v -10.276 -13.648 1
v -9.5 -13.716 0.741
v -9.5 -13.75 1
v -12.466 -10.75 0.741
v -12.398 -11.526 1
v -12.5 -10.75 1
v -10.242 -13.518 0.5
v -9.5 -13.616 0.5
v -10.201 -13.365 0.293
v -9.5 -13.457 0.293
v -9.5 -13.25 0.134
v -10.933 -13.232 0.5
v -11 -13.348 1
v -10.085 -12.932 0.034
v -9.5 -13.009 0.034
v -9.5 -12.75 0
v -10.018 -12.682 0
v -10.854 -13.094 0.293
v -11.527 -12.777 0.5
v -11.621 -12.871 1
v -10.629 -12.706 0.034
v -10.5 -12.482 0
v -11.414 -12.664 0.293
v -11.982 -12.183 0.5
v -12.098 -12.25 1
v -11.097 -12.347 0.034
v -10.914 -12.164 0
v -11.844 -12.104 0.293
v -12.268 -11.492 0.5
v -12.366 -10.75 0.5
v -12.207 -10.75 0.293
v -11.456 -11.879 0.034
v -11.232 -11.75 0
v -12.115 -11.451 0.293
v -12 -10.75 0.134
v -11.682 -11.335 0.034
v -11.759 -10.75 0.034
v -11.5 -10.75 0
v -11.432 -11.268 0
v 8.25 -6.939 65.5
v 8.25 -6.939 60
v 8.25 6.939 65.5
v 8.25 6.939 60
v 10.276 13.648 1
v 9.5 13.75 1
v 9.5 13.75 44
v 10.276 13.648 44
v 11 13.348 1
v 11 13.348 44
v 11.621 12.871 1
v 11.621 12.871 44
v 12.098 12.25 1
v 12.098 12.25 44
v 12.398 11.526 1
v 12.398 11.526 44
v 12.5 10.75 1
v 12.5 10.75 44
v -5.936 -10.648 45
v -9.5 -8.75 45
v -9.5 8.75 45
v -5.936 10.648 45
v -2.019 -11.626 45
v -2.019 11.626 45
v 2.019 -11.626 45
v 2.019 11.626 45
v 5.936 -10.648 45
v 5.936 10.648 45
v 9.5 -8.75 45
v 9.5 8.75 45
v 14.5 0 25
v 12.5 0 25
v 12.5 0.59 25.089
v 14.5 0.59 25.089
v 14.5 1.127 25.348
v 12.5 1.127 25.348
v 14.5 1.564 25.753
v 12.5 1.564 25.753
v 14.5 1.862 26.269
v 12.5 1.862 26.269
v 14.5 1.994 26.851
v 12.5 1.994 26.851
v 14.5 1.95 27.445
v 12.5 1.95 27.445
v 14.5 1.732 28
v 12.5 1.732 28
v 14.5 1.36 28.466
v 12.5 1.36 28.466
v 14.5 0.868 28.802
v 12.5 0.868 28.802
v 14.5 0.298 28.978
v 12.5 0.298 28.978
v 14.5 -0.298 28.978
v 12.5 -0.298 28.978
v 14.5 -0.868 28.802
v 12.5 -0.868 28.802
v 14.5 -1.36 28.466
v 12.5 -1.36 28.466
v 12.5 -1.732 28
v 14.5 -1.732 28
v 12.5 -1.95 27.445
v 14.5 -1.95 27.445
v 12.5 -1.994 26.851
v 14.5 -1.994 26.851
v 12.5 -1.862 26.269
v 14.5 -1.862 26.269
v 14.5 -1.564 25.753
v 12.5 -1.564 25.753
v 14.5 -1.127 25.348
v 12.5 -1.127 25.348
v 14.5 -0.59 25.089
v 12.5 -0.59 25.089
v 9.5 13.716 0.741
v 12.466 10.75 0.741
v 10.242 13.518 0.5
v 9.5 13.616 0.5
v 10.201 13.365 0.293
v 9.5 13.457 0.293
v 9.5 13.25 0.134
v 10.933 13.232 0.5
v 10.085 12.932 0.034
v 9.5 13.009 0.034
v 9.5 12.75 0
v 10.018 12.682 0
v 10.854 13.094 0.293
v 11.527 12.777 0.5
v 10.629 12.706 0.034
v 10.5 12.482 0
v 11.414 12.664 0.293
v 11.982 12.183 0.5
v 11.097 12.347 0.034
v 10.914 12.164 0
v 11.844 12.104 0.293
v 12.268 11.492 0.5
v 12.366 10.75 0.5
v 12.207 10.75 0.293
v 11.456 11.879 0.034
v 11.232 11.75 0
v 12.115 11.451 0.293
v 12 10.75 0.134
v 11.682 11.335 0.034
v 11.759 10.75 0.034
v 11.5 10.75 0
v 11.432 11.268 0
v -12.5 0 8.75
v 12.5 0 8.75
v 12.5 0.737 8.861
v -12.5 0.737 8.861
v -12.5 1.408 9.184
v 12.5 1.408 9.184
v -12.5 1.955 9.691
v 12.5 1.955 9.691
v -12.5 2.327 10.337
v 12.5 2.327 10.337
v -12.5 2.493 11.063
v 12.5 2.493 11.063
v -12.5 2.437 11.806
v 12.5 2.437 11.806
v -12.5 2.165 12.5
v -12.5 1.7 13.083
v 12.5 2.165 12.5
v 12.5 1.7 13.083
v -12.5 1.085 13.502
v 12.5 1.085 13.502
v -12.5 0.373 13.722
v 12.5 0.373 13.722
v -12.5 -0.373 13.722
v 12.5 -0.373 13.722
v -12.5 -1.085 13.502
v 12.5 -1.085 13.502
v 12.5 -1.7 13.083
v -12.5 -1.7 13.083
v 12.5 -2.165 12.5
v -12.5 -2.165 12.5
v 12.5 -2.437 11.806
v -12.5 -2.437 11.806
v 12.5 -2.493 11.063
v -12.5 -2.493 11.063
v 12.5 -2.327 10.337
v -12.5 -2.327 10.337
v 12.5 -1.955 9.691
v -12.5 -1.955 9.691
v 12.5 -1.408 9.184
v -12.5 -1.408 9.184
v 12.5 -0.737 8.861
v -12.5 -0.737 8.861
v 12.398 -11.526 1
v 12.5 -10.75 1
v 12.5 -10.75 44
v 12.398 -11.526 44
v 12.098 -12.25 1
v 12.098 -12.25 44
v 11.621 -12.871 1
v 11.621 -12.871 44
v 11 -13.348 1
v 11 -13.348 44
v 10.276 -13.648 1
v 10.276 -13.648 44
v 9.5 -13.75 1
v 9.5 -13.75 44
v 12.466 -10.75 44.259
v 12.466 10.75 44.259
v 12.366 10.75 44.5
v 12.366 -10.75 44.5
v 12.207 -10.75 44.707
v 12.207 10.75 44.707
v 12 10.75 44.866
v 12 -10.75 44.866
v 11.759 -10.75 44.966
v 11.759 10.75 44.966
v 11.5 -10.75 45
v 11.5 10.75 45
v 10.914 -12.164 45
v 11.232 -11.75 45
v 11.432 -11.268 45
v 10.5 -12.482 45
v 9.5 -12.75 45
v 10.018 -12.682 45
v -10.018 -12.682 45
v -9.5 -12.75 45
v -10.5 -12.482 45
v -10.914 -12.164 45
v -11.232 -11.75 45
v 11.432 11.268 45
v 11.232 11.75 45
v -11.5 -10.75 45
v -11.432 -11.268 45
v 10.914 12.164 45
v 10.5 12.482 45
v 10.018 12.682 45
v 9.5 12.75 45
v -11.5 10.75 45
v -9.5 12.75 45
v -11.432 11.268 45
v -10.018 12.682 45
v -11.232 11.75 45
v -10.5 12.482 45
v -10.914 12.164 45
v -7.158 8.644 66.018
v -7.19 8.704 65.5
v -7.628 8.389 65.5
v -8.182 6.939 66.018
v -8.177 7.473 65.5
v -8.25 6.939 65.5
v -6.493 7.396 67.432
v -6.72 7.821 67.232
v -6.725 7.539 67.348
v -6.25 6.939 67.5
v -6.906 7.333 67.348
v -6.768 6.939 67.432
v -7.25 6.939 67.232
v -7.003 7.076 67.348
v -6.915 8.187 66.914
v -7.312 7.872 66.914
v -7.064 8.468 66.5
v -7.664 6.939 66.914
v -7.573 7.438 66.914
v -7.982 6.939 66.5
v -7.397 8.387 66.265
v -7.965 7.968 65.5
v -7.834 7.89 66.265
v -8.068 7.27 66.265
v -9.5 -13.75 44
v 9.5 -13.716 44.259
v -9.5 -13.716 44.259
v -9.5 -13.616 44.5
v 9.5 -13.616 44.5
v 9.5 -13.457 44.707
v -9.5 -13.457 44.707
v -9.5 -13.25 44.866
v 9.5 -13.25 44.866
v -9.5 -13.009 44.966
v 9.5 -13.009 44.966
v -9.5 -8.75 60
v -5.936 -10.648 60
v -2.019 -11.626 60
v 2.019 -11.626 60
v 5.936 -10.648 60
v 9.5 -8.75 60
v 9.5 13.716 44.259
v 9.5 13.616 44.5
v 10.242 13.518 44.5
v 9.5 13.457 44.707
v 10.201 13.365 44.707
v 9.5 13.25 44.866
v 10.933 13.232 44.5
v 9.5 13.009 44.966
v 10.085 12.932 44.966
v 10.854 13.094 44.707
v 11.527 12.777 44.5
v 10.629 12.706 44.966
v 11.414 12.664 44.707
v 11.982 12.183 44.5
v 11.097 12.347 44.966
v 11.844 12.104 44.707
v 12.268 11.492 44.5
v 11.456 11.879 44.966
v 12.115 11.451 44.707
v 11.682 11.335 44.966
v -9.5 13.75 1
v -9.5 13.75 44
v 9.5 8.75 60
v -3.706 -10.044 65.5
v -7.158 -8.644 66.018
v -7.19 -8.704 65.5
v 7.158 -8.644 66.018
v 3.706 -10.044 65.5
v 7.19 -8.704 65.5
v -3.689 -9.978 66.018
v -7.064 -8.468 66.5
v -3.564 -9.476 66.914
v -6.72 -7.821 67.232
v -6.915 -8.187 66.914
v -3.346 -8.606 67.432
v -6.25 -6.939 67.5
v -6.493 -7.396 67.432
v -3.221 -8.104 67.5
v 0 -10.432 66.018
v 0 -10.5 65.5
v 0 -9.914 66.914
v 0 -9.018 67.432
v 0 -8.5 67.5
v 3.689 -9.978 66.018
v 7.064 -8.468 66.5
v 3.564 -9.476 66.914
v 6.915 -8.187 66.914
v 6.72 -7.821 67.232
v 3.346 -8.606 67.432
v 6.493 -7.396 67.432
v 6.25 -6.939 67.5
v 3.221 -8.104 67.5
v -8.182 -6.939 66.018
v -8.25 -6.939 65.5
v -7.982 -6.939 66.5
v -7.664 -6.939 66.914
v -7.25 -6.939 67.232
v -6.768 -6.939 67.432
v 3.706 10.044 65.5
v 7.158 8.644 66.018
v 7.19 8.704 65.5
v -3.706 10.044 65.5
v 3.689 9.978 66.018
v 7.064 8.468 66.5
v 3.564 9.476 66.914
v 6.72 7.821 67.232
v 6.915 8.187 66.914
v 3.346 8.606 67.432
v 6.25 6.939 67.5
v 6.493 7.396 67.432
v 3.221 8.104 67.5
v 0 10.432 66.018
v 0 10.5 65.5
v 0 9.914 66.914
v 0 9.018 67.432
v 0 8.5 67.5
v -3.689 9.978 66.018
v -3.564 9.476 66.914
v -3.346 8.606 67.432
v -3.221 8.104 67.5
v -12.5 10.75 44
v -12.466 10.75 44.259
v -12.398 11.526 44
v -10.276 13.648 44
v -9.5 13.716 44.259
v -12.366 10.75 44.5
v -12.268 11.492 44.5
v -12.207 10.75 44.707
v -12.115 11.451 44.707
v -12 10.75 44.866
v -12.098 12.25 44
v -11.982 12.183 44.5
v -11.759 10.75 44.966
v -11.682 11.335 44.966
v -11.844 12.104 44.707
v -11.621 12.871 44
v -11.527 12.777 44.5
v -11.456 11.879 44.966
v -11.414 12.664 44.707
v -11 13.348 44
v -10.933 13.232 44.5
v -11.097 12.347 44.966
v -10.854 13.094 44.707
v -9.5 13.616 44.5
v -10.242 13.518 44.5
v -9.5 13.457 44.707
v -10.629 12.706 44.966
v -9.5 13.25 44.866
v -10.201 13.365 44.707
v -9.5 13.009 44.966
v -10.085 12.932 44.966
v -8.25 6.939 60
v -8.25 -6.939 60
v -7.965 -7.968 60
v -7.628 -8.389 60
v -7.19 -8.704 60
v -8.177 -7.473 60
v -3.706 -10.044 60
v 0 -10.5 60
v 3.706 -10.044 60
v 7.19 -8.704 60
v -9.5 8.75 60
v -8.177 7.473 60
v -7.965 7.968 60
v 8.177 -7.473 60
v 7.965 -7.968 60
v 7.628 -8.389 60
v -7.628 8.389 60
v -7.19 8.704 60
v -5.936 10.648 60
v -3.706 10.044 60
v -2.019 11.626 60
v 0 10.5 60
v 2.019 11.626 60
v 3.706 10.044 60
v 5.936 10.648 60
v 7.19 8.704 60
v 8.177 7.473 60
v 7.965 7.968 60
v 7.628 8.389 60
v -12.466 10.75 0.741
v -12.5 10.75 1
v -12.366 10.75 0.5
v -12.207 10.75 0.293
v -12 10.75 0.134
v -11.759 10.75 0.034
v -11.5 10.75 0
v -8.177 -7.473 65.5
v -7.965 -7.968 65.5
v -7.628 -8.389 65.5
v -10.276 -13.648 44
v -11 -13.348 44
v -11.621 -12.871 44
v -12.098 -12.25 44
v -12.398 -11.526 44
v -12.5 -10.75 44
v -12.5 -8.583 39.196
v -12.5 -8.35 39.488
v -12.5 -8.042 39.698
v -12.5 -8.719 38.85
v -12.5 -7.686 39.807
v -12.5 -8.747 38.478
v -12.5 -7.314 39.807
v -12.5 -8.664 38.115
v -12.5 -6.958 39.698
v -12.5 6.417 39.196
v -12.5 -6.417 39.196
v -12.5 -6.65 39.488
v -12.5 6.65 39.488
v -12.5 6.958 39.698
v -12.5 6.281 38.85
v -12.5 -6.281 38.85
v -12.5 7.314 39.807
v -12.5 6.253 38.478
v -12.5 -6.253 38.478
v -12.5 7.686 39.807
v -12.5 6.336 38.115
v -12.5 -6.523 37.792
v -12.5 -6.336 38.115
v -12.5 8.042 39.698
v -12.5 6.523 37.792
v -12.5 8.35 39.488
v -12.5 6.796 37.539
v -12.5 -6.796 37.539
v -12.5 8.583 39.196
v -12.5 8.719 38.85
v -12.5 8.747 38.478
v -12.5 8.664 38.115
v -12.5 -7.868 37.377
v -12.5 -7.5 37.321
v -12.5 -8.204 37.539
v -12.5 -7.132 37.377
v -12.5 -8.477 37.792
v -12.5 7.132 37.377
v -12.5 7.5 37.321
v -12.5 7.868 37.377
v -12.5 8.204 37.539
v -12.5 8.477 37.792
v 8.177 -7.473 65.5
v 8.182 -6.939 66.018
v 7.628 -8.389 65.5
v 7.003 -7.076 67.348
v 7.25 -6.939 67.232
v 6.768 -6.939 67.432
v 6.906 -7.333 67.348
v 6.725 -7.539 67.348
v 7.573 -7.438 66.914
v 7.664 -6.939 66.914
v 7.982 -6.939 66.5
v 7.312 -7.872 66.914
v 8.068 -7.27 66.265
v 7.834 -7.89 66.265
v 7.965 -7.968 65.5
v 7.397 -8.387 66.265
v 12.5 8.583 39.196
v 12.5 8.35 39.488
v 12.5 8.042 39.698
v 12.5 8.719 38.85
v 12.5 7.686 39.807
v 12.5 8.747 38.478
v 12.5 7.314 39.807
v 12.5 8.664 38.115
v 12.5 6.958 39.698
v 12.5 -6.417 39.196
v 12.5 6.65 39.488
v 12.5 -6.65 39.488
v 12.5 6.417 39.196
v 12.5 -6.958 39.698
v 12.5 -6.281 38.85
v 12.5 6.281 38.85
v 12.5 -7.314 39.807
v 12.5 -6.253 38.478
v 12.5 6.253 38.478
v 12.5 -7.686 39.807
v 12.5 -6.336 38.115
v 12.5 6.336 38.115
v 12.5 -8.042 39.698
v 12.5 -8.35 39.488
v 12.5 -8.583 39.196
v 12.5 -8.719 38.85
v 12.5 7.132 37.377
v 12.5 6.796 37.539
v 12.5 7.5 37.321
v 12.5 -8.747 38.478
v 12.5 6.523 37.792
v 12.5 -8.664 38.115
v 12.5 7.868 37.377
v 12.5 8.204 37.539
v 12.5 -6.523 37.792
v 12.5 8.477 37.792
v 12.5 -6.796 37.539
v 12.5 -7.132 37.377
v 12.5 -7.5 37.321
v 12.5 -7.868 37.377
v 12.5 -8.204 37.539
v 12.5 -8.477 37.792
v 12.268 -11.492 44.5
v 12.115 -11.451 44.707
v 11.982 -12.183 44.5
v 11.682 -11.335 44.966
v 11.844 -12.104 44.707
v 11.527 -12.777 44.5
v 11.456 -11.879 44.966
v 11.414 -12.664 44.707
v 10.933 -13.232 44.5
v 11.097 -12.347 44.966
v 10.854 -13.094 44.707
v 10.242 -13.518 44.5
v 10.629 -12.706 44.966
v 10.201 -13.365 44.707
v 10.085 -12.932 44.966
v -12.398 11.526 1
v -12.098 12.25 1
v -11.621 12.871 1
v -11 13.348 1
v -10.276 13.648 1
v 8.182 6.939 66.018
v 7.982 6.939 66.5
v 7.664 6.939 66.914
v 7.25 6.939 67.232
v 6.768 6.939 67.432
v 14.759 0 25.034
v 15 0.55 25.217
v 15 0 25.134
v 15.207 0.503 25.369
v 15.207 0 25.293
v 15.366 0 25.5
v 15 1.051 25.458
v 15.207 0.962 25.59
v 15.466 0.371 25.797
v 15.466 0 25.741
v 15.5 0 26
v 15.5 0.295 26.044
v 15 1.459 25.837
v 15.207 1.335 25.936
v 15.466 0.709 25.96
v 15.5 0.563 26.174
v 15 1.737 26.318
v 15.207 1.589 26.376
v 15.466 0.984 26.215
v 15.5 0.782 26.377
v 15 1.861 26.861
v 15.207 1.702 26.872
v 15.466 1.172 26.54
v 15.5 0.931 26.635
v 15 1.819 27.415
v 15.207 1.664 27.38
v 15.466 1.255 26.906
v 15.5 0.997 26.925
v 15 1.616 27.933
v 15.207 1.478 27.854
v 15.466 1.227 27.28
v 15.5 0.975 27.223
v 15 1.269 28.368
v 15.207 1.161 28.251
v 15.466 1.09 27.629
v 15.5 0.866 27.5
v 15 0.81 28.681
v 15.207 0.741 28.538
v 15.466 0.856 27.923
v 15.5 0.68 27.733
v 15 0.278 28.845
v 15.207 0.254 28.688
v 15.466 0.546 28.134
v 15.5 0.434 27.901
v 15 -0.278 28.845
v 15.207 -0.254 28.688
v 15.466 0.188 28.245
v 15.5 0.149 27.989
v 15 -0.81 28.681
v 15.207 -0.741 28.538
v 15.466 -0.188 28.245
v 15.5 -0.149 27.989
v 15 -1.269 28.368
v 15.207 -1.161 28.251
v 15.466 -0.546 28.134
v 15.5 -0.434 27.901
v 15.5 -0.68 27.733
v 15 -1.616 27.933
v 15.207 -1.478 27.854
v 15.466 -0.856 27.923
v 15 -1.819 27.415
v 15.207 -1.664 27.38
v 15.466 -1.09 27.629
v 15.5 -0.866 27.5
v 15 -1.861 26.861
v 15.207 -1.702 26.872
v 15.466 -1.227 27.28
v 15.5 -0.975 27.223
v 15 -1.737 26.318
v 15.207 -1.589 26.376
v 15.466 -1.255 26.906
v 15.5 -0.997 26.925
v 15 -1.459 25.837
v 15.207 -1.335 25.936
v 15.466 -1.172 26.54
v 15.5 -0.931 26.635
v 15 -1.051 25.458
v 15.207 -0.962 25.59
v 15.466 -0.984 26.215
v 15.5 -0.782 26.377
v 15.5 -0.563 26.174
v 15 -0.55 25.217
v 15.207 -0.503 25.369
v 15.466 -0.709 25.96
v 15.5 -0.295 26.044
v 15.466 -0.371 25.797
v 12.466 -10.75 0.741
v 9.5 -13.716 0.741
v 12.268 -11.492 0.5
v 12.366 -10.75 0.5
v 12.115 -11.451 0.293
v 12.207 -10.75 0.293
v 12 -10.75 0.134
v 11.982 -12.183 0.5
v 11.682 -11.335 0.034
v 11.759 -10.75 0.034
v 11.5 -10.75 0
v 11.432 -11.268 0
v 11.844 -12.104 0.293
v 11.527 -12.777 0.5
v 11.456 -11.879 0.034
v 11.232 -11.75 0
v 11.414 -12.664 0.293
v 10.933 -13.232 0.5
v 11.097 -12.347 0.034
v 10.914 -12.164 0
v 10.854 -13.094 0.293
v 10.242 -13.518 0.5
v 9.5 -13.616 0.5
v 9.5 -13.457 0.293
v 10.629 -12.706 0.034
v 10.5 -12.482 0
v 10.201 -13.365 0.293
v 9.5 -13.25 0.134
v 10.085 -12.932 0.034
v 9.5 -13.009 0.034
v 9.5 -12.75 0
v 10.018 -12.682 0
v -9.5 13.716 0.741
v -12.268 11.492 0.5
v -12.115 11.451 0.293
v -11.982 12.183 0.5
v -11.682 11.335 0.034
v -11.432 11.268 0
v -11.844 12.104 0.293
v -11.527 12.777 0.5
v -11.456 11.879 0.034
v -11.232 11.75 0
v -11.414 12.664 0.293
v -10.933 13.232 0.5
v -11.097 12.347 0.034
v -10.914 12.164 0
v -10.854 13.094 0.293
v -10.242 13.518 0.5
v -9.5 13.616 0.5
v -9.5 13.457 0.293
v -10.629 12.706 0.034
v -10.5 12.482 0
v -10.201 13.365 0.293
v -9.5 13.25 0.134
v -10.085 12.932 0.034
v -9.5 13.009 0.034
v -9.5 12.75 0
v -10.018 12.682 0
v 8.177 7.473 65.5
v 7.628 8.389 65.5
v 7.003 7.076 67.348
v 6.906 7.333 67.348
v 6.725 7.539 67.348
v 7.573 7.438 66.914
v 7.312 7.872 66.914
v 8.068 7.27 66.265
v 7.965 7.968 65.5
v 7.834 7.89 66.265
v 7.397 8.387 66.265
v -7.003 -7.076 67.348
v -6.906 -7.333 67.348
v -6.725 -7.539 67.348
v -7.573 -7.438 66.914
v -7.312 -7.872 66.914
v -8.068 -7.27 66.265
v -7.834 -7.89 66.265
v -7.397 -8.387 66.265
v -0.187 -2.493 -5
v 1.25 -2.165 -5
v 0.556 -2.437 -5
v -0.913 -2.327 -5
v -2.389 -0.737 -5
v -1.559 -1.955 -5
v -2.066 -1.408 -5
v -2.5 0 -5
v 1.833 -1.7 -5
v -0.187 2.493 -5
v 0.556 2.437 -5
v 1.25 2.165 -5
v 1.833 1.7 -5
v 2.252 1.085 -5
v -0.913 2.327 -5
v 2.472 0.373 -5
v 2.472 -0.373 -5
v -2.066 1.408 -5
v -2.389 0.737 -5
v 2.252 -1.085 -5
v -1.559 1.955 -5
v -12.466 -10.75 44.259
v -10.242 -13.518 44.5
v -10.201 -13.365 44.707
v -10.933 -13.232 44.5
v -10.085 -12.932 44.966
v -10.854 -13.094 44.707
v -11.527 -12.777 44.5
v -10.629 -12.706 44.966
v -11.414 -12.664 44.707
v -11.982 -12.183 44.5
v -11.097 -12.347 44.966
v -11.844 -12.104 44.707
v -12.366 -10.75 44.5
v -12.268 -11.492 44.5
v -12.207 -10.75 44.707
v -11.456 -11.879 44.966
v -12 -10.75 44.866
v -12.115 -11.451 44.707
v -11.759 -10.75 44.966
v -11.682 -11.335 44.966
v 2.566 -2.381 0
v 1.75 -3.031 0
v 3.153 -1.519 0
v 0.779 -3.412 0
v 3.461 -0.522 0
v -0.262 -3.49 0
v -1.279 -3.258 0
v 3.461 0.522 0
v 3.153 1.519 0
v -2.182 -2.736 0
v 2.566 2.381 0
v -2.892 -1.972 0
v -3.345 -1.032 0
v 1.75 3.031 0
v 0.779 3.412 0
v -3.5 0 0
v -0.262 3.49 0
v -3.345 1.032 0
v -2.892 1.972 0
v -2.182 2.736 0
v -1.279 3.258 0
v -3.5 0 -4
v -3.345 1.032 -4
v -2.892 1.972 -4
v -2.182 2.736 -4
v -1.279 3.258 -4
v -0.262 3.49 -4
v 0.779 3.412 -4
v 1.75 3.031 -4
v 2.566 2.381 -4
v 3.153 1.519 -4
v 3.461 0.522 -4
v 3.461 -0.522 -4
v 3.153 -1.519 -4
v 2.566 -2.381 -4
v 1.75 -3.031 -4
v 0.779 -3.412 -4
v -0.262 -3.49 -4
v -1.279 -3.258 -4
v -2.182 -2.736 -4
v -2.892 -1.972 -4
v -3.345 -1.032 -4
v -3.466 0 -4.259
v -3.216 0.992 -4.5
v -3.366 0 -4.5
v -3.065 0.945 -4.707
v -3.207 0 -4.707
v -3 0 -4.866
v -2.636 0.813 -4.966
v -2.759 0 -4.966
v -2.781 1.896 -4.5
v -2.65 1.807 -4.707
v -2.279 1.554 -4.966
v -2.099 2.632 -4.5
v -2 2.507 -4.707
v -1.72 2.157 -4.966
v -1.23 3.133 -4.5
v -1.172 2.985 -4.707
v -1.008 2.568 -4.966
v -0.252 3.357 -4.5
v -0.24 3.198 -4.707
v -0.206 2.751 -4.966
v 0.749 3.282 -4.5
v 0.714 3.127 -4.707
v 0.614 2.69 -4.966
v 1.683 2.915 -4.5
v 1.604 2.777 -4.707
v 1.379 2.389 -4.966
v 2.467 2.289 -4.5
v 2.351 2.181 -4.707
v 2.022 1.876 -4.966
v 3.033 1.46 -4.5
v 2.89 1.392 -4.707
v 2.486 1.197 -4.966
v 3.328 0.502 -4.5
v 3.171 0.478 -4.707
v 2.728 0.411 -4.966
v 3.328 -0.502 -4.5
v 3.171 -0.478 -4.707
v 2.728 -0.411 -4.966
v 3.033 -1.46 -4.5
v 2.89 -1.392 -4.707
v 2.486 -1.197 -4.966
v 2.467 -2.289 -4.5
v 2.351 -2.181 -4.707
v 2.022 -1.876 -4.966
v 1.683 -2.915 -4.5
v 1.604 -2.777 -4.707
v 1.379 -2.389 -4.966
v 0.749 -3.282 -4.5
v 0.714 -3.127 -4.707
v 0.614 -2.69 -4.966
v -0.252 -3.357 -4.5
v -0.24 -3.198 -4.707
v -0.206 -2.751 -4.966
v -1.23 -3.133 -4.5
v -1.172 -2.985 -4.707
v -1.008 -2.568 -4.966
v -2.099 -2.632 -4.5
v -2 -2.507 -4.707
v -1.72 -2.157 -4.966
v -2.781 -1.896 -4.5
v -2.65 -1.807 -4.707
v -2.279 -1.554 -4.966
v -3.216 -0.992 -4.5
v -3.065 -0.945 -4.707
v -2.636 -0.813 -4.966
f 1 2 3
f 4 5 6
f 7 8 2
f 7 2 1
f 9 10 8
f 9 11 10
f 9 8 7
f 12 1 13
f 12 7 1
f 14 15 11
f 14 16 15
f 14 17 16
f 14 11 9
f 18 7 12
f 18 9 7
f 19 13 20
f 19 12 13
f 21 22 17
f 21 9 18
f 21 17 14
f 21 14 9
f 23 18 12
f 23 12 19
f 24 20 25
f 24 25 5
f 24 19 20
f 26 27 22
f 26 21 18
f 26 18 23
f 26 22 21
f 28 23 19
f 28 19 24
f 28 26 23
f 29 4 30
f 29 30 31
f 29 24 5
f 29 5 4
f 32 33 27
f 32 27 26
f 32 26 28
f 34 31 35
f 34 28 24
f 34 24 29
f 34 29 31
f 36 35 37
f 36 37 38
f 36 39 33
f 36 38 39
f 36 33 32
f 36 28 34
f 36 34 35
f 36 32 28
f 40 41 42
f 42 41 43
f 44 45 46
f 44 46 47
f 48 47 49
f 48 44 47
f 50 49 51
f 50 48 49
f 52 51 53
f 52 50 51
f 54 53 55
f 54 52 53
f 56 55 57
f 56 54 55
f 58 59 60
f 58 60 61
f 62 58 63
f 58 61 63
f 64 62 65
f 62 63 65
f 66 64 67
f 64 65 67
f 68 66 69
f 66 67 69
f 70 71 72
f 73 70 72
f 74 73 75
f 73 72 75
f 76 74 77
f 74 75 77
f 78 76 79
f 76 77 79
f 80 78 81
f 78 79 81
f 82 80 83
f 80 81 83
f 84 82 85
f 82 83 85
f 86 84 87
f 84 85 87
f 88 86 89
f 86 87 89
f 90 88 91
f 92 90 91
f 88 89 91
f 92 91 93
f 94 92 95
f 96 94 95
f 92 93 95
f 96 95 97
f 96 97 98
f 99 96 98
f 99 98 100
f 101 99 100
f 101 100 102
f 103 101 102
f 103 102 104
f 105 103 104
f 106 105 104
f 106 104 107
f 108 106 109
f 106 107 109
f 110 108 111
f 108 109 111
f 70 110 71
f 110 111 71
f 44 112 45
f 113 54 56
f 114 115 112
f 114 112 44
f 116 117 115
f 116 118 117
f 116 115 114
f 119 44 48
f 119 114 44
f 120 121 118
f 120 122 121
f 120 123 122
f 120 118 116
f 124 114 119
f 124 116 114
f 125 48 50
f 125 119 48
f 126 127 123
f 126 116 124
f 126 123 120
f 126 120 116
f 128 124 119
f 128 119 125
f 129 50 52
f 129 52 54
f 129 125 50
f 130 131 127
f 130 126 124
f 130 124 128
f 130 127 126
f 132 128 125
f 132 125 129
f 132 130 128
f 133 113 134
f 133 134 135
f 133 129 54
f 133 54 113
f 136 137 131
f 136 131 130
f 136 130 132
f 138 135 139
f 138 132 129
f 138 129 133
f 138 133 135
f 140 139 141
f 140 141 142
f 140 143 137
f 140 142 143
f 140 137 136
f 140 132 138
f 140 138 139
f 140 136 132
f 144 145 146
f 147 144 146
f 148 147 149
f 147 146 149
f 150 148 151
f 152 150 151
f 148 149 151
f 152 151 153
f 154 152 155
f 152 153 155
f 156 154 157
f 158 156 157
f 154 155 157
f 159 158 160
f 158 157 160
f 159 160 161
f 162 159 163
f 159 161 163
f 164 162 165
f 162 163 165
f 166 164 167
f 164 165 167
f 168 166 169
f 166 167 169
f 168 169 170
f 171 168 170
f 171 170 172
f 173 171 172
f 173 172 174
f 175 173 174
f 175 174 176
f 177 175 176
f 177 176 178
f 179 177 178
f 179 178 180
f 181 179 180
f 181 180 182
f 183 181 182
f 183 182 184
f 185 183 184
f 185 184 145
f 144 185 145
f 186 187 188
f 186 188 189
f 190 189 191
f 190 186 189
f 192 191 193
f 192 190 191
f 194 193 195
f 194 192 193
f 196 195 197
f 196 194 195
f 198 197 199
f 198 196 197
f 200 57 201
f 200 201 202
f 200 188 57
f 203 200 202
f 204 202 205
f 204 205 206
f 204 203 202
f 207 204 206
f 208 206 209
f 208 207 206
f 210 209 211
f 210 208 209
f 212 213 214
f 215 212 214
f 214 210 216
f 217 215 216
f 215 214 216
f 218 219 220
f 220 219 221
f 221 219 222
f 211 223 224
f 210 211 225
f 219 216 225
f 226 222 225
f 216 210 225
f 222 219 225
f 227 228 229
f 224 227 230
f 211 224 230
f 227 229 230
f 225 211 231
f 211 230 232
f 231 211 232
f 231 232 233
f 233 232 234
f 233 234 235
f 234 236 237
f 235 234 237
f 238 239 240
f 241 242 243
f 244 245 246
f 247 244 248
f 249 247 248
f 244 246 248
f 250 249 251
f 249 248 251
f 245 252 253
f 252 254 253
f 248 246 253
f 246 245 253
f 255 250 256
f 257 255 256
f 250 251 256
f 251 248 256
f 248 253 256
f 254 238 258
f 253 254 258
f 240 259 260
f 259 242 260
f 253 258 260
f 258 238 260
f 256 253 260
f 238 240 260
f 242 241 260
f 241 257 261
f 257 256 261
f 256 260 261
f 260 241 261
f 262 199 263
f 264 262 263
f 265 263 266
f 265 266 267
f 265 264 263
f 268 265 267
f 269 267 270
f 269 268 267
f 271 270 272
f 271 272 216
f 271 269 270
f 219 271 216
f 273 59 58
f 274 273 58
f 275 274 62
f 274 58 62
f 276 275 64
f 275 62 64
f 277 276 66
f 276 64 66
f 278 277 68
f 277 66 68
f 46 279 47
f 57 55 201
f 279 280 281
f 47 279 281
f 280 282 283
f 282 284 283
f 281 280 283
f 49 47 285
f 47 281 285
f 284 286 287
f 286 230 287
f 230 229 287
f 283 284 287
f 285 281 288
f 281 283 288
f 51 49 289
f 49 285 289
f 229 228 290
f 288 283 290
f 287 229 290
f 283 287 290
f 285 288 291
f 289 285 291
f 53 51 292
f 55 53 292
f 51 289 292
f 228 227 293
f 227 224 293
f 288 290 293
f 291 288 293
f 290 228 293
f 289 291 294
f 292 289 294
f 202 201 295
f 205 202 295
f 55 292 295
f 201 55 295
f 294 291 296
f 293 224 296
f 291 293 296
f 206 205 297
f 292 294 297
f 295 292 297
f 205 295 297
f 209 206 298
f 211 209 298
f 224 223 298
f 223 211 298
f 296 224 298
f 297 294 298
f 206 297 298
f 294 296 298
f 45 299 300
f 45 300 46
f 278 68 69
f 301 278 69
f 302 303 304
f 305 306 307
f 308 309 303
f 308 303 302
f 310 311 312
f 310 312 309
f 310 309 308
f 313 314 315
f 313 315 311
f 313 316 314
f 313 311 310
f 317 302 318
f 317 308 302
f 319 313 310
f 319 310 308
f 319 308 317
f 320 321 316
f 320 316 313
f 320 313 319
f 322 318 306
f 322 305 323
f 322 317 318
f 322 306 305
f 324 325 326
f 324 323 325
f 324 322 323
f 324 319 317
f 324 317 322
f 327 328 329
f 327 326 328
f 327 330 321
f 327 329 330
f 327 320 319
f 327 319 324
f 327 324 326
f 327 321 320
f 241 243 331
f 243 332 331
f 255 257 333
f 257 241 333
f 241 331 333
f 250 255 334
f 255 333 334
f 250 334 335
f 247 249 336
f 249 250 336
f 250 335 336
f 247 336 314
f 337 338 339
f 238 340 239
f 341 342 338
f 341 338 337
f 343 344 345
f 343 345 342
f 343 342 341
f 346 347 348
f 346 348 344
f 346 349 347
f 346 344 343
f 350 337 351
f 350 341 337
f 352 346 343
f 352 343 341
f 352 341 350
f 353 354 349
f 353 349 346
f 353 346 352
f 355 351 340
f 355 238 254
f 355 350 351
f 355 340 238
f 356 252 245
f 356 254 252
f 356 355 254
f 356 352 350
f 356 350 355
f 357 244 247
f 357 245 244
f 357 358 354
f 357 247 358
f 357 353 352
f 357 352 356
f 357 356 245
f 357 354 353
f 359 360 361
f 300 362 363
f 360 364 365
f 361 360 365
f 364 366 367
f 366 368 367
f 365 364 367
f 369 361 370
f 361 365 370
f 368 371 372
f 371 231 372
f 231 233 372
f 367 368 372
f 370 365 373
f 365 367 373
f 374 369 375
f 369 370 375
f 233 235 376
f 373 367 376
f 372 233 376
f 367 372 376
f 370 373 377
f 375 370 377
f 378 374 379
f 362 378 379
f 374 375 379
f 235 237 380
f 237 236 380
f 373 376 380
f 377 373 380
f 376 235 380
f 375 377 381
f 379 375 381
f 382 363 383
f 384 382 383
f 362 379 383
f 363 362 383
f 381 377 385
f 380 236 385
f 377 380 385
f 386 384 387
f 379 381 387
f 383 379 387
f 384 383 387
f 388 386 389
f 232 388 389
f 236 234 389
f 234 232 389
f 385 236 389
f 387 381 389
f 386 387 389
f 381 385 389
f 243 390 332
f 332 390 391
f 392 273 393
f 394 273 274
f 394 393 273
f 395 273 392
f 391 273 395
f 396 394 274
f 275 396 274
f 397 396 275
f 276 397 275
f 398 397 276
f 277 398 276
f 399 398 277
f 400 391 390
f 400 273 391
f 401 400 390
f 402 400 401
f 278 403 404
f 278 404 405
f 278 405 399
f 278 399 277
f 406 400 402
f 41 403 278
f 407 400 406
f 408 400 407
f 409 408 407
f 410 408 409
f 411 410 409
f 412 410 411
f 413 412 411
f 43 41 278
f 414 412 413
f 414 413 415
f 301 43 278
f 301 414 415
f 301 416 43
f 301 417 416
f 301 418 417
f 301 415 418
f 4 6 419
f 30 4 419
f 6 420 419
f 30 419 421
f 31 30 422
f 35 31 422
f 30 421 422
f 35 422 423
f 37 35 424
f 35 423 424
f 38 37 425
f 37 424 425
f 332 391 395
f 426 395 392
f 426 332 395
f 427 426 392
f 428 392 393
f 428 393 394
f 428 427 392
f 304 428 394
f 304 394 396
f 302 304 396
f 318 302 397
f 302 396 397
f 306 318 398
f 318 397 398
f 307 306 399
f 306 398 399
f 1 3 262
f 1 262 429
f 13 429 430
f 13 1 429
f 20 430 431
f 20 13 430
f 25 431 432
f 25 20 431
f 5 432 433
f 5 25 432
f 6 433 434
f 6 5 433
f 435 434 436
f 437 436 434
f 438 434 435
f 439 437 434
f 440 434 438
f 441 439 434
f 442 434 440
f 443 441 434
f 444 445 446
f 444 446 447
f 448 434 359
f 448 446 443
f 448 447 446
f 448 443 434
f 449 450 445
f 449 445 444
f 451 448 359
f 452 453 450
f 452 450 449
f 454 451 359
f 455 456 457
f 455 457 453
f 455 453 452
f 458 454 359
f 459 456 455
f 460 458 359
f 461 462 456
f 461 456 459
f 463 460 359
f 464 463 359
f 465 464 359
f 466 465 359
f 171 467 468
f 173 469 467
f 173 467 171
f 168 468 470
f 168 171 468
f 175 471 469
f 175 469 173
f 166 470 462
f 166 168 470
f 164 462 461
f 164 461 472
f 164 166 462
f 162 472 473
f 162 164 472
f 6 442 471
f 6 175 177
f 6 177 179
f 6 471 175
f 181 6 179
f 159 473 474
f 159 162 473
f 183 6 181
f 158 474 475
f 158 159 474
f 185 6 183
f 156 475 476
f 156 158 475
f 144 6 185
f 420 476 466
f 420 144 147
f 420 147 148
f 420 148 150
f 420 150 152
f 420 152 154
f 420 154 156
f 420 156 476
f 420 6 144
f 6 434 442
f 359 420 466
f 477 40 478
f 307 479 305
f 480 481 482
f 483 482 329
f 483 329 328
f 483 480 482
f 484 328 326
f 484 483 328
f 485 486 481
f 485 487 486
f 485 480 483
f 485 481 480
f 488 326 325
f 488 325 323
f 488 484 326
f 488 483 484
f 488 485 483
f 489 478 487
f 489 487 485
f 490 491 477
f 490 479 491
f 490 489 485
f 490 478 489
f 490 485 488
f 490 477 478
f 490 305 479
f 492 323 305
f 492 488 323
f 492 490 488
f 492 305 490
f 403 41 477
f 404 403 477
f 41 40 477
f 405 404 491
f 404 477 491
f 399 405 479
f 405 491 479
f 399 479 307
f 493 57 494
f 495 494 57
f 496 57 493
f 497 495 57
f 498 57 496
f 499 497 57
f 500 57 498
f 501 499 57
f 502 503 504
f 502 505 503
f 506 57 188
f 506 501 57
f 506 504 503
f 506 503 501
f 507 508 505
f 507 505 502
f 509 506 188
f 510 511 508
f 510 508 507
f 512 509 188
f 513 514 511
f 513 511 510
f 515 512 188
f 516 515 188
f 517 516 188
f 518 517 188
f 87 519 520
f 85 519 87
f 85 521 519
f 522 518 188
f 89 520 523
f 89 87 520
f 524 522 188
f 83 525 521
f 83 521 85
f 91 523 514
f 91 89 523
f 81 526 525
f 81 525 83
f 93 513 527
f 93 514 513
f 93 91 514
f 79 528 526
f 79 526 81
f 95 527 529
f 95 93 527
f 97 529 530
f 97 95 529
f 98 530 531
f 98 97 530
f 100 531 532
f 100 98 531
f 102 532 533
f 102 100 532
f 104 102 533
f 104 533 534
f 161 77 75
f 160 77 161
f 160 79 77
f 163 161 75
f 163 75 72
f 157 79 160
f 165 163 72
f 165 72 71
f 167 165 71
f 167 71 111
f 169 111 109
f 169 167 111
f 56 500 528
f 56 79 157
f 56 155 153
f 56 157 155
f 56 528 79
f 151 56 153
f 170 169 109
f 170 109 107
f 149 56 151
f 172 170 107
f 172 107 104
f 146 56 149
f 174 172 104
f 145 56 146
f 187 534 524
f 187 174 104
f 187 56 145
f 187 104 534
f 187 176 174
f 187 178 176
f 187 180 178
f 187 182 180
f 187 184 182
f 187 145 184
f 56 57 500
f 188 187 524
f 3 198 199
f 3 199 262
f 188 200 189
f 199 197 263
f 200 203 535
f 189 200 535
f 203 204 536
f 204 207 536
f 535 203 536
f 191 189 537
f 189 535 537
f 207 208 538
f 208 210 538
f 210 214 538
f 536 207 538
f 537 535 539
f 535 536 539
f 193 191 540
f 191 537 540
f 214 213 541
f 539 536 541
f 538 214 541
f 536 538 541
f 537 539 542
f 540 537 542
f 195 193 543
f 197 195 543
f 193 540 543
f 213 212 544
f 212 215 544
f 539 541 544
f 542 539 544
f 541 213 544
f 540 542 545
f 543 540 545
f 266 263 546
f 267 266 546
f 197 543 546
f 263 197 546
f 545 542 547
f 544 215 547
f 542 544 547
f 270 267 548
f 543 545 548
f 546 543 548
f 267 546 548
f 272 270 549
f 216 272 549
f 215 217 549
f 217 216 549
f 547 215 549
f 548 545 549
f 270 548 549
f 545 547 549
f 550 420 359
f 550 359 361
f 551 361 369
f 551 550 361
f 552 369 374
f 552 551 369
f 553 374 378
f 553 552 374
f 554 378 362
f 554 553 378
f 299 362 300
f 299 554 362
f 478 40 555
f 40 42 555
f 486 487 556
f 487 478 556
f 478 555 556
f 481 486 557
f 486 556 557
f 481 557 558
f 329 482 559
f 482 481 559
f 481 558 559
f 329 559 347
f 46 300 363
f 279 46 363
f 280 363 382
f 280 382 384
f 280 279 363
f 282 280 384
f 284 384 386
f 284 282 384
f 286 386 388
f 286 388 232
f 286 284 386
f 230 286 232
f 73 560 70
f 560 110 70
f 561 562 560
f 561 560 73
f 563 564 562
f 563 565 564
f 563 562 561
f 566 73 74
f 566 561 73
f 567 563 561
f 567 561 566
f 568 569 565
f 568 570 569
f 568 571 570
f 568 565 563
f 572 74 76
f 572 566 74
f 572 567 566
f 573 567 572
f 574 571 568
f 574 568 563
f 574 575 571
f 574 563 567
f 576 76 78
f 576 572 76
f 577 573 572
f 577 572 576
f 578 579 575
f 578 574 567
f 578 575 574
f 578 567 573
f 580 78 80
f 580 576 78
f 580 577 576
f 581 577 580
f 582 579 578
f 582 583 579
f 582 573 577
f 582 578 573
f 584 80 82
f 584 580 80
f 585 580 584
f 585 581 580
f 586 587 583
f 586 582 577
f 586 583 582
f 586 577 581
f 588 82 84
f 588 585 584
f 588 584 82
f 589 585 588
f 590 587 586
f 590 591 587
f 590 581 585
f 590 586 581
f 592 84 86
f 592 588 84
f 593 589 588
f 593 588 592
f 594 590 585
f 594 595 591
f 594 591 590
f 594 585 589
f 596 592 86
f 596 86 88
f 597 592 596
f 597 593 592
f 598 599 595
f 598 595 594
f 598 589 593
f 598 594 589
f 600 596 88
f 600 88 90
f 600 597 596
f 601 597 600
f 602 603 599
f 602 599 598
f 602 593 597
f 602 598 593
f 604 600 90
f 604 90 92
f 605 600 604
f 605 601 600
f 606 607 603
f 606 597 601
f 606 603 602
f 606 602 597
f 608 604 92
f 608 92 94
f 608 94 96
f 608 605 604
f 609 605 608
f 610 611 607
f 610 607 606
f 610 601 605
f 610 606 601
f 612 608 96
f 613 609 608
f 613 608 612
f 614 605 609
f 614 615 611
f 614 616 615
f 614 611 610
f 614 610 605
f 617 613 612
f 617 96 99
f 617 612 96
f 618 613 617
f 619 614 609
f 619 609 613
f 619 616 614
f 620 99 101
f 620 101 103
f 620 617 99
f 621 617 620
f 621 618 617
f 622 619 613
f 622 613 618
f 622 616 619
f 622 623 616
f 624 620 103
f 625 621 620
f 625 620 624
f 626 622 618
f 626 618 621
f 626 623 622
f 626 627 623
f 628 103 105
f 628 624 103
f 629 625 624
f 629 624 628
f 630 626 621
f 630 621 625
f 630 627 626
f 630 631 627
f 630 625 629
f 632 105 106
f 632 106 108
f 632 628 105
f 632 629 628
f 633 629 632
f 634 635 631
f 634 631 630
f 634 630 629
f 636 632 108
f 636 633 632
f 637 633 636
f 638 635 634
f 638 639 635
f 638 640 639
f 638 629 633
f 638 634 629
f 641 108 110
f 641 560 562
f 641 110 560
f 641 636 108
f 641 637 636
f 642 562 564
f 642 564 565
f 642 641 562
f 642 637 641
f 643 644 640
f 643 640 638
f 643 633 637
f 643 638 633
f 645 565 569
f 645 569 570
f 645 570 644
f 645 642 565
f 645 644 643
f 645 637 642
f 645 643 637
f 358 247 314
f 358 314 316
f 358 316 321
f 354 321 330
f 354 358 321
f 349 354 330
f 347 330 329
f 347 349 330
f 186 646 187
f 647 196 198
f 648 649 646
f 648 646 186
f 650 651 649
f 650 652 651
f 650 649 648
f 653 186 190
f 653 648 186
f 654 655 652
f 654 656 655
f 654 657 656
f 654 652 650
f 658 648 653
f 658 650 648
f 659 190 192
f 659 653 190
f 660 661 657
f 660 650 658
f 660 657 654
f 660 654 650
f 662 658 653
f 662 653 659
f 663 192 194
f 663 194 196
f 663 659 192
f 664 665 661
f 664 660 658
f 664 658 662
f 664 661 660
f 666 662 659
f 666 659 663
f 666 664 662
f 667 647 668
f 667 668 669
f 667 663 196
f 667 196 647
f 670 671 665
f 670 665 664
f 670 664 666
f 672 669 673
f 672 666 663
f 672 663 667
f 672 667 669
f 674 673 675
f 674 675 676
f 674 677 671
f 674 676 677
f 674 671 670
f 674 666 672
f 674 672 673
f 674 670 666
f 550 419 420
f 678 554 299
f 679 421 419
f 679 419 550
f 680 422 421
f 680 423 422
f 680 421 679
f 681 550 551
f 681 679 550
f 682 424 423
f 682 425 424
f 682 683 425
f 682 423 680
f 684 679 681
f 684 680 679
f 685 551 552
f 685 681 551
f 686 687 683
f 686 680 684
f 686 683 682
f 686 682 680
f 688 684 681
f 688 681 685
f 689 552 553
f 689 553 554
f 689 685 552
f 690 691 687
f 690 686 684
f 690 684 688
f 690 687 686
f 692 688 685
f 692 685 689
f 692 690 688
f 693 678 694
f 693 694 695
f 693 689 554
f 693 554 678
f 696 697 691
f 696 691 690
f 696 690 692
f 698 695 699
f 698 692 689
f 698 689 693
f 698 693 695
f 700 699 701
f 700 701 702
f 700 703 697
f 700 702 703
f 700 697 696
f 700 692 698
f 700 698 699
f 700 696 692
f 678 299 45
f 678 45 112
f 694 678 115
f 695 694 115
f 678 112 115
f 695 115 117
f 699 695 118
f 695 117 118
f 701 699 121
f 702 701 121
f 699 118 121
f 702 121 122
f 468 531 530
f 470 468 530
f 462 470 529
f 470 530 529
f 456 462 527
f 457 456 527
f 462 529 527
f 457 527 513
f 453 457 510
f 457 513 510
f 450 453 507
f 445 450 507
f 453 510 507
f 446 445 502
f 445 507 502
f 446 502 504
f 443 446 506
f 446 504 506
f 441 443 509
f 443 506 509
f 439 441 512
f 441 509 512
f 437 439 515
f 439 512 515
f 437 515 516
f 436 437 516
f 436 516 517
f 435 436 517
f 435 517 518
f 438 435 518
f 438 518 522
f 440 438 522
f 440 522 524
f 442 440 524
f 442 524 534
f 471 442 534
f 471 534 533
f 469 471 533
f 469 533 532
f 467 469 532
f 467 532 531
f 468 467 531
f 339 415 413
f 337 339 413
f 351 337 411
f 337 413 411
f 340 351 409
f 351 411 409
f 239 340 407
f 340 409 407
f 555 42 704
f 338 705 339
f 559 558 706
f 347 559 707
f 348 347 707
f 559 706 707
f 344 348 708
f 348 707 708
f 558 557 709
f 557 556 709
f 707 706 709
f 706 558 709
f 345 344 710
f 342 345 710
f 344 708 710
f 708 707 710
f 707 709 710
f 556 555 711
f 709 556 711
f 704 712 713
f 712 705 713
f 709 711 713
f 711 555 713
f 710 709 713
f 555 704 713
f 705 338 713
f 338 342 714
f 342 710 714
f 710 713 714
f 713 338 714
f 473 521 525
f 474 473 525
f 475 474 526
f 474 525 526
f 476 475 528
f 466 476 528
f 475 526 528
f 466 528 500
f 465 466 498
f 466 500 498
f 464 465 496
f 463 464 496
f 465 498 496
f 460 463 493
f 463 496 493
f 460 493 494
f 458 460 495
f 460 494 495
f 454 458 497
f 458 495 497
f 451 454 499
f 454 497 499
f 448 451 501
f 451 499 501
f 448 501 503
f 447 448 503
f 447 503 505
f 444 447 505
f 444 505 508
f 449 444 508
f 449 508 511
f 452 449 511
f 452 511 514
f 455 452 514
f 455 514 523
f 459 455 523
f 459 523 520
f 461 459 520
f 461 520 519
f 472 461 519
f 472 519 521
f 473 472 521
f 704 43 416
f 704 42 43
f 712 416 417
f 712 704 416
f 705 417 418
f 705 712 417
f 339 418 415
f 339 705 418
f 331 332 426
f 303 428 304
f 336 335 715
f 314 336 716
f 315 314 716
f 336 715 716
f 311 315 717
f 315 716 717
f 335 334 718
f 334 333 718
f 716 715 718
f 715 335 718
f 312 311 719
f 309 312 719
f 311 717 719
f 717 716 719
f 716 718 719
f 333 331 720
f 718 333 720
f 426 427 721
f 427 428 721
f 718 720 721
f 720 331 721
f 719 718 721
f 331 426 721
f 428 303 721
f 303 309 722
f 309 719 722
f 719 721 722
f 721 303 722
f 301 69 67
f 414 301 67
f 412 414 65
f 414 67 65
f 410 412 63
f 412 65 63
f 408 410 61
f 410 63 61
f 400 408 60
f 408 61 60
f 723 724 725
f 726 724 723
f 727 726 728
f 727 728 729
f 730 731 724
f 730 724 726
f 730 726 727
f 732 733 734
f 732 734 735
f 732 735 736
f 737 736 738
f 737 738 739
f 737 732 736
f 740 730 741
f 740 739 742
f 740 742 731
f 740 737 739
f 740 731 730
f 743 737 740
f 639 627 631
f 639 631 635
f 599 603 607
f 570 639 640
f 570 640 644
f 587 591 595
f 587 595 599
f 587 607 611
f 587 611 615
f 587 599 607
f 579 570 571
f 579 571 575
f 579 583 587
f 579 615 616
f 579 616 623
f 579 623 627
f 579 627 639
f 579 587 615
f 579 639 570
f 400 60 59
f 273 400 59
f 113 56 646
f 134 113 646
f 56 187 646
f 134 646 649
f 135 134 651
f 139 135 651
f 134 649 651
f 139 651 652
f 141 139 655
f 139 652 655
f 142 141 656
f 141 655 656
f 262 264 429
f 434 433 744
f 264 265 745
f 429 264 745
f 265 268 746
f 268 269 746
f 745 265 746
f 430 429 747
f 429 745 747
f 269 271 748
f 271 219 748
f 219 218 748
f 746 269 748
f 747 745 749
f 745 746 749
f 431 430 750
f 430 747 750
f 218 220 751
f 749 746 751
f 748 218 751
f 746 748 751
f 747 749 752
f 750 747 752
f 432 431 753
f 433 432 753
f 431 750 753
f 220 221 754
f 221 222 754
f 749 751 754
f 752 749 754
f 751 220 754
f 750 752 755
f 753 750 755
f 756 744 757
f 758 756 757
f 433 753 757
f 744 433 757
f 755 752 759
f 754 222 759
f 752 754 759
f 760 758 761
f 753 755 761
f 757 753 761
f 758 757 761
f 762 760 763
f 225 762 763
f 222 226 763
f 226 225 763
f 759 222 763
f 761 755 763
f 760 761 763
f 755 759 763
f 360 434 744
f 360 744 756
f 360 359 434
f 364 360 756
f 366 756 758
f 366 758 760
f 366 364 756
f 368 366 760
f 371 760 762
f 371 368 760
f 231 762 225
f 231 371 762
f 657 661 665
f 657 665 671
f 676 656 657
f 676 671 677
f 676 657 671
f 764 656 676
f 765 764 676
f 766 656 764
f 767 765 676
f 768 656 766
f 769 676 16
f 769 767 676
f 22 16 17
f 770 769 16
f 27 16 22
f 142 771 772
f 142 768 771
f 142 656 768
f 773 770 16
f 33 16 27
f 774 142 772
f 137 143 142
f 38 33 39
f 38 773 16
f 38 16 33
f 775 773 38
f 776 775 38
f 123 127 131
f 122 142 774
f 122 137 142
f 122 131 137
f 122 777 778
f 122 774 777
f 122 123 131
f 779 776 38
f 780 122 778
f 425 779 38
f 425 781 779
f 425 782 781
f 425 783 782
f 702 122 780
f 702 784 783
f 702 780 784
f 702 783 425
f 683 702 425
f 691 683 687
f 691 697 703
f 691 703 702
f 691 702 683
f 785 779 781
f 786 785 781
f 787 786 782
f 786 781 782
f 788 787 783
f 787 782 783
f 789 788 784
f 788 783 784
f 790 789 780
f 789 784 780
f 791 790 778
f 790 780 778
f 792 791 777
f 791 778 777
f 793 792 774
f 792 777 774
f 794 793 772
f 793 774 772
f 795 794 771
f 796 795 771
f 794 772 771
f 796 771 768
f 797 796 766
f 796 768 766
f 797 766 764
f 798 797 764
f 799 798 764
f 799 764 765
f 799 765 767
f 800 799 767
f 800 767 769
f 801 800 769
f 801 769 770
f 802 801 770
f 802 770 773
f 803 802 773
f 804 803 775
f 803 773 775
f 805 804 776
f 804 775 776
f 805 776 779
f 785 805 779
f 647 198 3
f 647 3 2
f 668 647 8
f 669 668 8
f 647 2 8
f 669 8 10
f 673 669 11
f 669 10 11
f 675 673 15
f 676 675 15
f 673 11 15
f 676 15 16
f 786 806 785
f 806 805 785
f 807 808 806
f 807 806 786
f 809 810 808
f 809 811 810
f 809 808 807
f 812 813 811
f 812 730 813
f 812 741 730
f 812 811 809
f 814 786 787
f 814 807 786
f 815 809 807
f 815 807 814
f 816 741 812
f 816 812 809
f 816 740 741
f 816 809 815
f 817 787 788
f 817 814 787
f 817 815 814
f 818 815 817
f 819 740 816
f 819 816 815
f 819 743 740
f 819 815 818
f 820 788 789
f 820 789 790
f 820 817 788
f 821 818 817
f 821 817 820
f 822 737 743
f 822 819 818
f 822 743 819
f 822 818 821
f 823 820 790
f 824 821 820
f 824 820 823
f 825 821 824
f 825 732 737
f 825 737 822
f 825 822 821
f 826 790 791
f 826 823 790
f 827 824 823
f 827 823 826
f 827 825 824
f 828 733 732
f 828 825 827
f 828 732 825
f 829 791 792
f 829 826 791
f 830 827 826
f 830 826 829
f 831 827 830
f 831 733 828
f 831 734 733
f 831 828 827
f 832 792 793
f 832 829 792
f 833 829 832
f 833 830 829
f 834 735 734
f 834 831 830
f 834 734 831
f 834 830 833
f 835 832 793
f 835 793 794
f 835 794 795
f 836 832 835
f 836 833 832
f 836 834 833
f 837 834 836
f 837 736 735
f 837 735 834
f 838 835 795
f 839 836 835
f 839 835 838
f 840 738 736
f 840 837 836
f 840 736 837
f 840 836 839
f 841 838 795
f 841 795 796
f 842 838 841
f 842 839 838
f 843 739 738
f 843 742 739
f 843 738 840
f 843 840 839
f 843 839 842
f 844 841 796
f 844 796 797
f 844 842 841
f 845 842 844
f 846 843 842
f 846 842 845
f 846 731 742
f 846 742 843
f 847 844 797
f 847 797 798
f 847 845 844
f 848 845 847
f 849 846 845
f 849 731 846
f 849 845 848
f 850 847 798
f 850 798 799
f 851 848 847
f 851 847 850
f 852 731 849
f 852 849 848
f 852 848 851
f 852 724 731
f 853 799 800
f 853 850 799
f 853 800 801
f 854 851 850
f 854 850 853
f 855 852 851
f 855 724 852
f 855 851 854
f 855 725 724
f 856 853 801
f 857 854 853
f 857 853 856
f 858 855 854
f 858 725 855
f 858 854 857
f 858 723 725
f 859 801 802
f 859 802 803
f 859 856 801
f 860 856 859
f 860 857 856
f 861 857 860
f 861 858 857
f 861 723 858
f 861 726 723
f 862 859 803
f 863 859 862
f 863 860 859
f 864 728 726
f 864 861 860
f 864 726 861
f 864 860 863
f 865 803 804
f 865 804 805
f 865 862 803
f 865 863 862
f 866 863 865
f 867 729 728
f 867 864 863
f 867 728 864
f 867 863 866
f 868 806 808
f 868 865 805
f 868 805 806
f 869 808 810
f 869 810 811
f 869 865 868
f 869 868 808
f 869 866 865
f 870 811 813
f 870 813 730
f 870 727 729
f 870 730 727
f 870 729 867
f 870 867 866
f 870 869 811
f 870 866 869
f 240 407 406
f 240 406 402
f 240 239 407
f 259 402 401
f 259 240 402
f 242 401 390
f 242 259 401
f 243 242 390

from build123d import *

# Parameters (mm, degrees)
MOTORBODY1_DEPTH            = 45
MOTORBODY2_DEPTH            = 15
SIDE_ENGRAVEMENT_SKETCH_R   = 1.25
SIDE_ENGRAVEMENT_SKETCH_R_2 = 2.5
CUT_EXTRUDE1_DEPTH          = 26
SIDE_ENGRAVEMENT_SKETCH_3_R = 2
BOSS_EXTRUDE3_DEPTH         = 3
SKETCH4_R                   = 3.5
BOSS_EXTRUDE5_DEPTH         = 5
FILLET1_R                   = 1
BOSS_EXTRUDE6_DEPTH         = 7.5
FILLET3_R                   = 2


with BuildPart() as part:
    # MotorMainSketch → MotorBody1 (new body)
    with BuildSketch(Plane.XY):
        with BuildLine():
            Line((-9.5, 13.75), (9.5, 13.75))
            ThreePointArc((9.5, 13.75), (11.621320344, 12.871320344), (12.5, 10.75))
            Line((12.5, 10.75), (12.5, -10.75))
            ThreePointArc((12.5, -10.75), (11.621320344, -12.871320344), (9.5, -13.75))
            Line((9.5, -13.75), (-9.5, -13.75))
            ThreePointArc((-9.5, -13.75), (-11.621320344, -12.871320344), (-12.5, -10.75))
            Line((-12.5, -10.75), (-12.5, 10.75))
            ThreePointArc((-12.5, 10.75), (-11.621320344, 12.871320344), (-9.5, 13.75))
        make_face()
    extrude(amount=MOTORBODY1_DEPTH)

    # side engravement sketch → Cut-Extrude1 (cut, through all)
    with BuildSketch(Plane(origin=(12.5, 0, 0), x_dir=(0, 0, -1), z_dir=(1, 0, 0))):
        with Locations((-38.571428571, 7.5)):
            Circle(SIDE_ENGRAVEMENT_SKETCH_R)
        with Locations((-38.571428571, -7.5)):
            Circle(SIDE_ENGRAVEMENT_SKETCH_R)
        with Locations((-11.25, 0)):
            Circle(SIDE_ENGRAVEMENT_SKETCH_R_2)
    extrude(amount=-CUT_EXTRUDE1_DEPTH, mode=Mode.SUBTRACT)

    # side engravement sketch_3 → Boss-Extrude3 (add)
    with BuildSketch(Plane(origin=(12.5, 0, 0), x_dir=(0, 0, -1), z_dir=(1, 0, 0))):
        with Locations((-27, 0)):
            Circle(SIDE_ENGRAVEMENT_SKETCH_3_R)
    extrude(amount=BOSS_EXTRUDE3_DEPTH)

    # Sketch4 → Boss-Extrude5 (add)
    with BuildSketch(Plane(origin=(0, 0, 0), x_dir=(-1, 0, 0), z_dir=(0, 0, -1))):
        Circle(SKETCH4_R)
    extrude(amount=BOSS_EXTRUDE5_DEPTH)

    # Fillet1
    fillet1_edges = [part.edges().sort_by_distance(p)[0] for p in [
        (-11.621320344, 12.871320344, 45),
        (0, 13.75, 0),
        (11.621320344, 12.871320344, 0),
        (-12.5, 0, 45),
        (-11.621320344, -12.871320344, 45),
        (0, -13.75, 45),
        (11.621320344, -12.871320344, 45),
        (12.5, 0, 45),
        (15.5, 0, 29),
        (11.621320344, 12.871320344, 45),
        (3.5, 0, -5),
        (0, 13.75, 45),
        (12.5, 0, 0),
        (11.621320344, -12.871320344, 0),
        (0, -13.75, 0),
        (-11.621320344, -12.871320344, 0),
        (-12.5, 0, 0),
        (-11.621320344, 12.871320344, 0),
    ]]
    fillet(fillet1_edges, radius=FILLET1_R)


with BuildPart() as body_2:
    # Motorsketch → MotorBody2 (new body)
    with BuildSketch(Plane.XY.offset(45)):
        with BuildLine():
            Line((-9.5, 8.75), (-9.5, -8.75))
            ThreePointArc((-9.5, -8.75), (0, -11.75), (9.5, -8.75))
            Line((9.5, -8.75), (9.5, 8.75))
            ThreePointArc((9.5, 8.75), (0, 11.75), (-9.5, 8.75))
        make_face()
    extrude(amount=MOTORBODY2_DEPTH)

    # Sketch5 → Boss-Extrude6 (add)
    with BuildSketch(Plane.XY.offset(60)):
        with BuildLine():
            Line((8.25, -8.083603018), (8.25, 8.083603018))
            ThreePointArc((8.25, 8.083603018), (0, 10.5), (-8.25, 8.083603018))
            Line((-8.25, 8.083603018), (-8.25, -8.083603018))
            ThreePointArc((-8.25, -8.083603018), (0, -10.5), (8.25, -8.083603018))
        make_face()
    extrude(amount=BOSS_EXTRUDE6_DEPTH)

    # Fillet3
    fillet3_edges = [body_2.edges().sort_by_distance(p)[0] for p in [
        (8.25, -8.083603018, 63.75),
        (8.25, 8.083603018, 63.75),
        (-8.25, 8.083603018, 63.75),
        (-8.25, -8.083603018, 63.75),
        (8.25, 0, 67.5),
        (0, 10.5, 67.5),
        (-8.25, 0, 67.5),
        (0, -10.5, 67.5),
    ]]
    fillet(fillet3_edges, radius=FILLET3_R)


solid = Compound([part.part, body_2.part])
